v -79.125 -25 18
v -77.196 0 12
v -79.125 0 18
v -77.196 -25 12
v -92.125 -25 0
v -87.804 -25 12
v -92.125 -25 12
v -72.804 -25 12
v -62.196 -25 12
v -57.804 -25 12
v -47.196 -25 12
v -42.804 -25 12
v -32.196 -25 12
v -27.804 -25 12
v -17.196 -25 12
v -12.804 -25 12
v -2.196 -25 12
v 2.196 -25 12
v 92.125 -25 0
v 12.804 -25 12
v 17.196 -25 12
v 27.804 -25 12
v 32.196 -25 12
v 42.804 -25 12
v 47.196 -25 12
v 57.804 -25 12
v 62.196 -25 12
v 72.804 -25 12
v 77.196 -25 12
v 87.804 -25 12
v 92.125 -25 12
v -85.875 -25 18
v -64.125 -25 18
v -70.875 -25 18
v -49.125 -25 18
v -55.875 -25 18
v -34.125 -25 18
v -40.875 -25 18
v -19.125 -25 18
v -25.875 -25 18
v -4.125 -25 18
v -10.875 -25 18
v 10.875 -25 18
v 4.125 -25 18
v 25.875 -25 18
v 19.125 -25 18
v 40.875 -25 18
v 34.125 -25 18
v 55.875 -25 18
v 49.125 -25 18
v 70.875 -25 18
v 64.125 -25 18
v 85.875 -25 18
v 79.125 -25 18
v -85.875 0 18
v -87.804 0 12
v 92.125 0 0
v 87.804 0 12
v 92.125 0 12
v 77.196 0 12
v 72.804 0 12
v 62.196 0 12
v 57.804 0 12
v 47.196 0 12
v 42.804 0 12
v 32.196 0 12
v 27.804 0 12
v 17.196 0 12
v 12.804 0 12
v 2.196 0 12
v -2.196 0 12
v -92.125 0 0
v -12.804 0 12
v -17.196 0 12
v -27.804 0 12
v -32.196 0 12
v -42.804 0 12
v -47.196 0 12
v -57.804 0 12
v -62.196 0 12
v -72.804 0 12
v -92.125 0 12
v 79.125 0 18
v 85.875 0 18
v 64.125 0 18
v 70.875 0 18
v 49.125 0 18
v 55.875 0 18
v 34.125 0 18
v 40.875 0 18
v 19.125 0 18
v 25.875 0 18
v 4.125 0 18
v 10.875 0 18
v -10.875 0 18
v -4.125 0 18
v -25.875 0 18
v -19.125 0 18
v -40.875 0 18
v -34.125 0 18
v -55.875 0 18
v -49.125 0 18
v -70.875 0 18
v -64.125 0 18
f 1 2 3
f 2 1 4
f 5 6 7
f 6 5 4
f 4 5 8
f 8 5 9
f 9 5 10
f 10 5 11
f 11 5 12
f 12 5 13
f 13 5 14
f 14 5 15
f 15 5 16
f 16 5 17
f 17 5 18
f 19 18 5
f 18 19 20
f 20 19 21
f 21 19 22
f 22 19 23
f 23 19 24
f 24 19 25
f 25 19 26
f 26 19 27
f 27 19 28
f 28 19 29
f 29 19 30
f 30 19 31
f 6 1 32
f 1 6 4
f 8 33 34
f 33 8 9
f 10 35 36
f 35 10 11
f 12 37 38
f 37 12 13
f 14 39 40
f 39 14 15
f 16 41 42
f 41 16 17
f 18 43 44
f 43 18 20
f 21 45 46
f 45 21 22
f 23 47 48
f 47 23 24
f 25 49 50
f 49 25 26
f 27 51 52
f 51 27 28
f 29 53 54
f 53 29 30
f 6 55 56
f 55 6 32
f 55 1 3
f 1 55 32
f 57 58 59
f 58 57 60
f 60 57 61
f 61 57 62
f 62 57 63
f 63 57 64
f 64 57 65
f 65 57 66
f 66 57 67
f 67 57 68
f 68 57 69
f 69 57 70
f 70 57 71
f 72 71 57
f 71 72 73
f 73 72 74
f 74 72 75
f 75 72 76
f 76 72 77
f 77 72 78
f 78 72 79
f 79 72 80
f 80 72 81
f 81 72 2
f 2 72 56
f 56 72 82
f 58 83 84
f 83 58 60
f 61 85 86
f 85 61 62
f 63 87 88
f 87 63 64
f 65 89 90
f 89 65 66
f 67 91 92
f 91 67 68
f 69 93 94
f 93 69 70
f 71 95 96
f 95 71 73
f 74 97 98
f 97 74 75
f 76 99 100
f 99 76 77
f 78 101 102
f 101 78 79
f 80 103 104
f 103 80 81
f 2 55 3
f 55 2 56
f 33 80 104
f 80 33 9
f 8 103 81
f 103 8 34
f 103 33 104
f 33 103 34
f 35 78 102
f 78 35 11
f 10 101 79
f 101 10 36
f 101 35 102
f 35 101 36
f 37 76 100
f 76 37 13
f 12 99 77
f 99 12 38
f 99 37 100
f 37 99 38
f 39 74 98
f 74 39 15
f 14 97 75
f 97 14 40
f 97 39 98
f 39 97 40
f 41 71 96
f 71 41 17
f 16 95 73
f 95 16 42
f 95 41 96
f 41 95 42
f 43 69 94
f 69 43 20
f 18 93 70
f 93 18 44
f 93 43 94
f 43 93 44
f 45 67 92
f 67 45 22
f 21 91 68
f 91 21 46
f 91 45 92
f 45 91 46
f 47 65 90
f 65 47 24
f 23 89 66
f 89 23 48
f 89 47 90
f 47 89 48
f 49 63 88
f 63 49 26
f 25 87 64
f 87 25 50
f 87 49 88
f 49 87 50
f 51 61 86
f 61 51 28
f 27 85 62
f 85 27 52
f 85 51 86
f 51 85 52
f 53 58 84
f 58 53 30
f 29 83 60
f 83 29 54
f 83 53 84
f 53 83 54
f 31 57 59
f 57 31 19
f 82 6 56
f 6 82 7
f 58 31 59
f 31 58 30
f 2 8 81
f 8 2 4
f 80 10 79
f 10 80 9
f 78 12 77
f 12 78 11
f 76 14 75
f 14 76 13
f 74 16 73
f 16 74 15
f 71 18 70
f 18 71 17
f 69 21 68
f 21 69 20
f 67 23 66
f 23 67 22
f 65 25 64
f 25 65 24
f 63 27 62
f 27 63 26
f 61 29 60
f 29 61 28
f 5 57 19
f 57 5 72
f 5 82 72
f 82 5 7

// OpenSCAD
$fn = 32;

// ----------------------------------------------------------------------
// Toothed rack, 12 teeth
// 15 mm pitch, 6 mm teeth
// ----------------------------------------------------------------------

// --- parameters (mm) ---
bar_w = 25;      // bar width (Y)
bar_h = 12;      // bar height (Z)
teeth = 12;      // number of teeth
pitch = 15;      // tooth pitch
tooth_h = 6;     // tooth height above the bar
root_w = 11.25;  // tooth width at the root
crest_w = 6.75;  // tooth width at the crest

// --- derived feature positions (mm) ---
span = (teeth - 1) * pitch;  // = 165   distance between the outer teeth
bar_l = span + root_w + 8;   // = 184.25   bar length: teeth plus 4 mm at each end
tooth_x = -span / 2;         // = -82.5   X of the first tooth
height = bar_h + tooth_h;    // = 18   overall height
feature_centers = [
  [tooth_x + 0 * pitch, -bar_w / 2],
  [tooth_x + 1 * pitch, -bar_w / 2],
  [tooth_x + 2 * pitch, -bar_w / 2],
  [tooth_x + 3 * pitch, -bar_w / 2],
  [tooth_x + 4 * pitch, -bar_w / 2],
  [tooth_x + 5 * pitch, -bar_w / 2],
  [tooth_x + 6 * pitch, -bar_w / 2],
  [tooth_x + 7 * pitch, -bar_w / 2],
  [tooth_x + 8 * pitch, -bar_w / 2],
  [tooth_x + 9 * pitch, -bar_w / 2],
  [tooth_x + 10 * pitch, -bar_w / 2],
  [tooth_x + 11 * pitch, -bar_w / 2]
];   // tooth centre line, drives the tooth loop

// bar with a rack of teeth, one extruded trapezoium per centre
module rack_tooth() {
  linear_extrude(height = bar_w)
    polygon(points = [
      [0, 0],
      [root_w, 0],
      [root_w / 2 + crest_w / 2, tooth_h + 1],
      [root_w / 2 - crest_w / 2, tooth_h + 1]
    ]);
}

union() {
  translate([-bar_l / 2, -bar_w, 0]) cube([bar_l, bar_w, bar_h]);
  for (centre = feature_centers)
    translate([centre[0] - root_w / 2, 0, bar_h - 1]) rotate([90, 0, 0]) rack_tooth();
}
